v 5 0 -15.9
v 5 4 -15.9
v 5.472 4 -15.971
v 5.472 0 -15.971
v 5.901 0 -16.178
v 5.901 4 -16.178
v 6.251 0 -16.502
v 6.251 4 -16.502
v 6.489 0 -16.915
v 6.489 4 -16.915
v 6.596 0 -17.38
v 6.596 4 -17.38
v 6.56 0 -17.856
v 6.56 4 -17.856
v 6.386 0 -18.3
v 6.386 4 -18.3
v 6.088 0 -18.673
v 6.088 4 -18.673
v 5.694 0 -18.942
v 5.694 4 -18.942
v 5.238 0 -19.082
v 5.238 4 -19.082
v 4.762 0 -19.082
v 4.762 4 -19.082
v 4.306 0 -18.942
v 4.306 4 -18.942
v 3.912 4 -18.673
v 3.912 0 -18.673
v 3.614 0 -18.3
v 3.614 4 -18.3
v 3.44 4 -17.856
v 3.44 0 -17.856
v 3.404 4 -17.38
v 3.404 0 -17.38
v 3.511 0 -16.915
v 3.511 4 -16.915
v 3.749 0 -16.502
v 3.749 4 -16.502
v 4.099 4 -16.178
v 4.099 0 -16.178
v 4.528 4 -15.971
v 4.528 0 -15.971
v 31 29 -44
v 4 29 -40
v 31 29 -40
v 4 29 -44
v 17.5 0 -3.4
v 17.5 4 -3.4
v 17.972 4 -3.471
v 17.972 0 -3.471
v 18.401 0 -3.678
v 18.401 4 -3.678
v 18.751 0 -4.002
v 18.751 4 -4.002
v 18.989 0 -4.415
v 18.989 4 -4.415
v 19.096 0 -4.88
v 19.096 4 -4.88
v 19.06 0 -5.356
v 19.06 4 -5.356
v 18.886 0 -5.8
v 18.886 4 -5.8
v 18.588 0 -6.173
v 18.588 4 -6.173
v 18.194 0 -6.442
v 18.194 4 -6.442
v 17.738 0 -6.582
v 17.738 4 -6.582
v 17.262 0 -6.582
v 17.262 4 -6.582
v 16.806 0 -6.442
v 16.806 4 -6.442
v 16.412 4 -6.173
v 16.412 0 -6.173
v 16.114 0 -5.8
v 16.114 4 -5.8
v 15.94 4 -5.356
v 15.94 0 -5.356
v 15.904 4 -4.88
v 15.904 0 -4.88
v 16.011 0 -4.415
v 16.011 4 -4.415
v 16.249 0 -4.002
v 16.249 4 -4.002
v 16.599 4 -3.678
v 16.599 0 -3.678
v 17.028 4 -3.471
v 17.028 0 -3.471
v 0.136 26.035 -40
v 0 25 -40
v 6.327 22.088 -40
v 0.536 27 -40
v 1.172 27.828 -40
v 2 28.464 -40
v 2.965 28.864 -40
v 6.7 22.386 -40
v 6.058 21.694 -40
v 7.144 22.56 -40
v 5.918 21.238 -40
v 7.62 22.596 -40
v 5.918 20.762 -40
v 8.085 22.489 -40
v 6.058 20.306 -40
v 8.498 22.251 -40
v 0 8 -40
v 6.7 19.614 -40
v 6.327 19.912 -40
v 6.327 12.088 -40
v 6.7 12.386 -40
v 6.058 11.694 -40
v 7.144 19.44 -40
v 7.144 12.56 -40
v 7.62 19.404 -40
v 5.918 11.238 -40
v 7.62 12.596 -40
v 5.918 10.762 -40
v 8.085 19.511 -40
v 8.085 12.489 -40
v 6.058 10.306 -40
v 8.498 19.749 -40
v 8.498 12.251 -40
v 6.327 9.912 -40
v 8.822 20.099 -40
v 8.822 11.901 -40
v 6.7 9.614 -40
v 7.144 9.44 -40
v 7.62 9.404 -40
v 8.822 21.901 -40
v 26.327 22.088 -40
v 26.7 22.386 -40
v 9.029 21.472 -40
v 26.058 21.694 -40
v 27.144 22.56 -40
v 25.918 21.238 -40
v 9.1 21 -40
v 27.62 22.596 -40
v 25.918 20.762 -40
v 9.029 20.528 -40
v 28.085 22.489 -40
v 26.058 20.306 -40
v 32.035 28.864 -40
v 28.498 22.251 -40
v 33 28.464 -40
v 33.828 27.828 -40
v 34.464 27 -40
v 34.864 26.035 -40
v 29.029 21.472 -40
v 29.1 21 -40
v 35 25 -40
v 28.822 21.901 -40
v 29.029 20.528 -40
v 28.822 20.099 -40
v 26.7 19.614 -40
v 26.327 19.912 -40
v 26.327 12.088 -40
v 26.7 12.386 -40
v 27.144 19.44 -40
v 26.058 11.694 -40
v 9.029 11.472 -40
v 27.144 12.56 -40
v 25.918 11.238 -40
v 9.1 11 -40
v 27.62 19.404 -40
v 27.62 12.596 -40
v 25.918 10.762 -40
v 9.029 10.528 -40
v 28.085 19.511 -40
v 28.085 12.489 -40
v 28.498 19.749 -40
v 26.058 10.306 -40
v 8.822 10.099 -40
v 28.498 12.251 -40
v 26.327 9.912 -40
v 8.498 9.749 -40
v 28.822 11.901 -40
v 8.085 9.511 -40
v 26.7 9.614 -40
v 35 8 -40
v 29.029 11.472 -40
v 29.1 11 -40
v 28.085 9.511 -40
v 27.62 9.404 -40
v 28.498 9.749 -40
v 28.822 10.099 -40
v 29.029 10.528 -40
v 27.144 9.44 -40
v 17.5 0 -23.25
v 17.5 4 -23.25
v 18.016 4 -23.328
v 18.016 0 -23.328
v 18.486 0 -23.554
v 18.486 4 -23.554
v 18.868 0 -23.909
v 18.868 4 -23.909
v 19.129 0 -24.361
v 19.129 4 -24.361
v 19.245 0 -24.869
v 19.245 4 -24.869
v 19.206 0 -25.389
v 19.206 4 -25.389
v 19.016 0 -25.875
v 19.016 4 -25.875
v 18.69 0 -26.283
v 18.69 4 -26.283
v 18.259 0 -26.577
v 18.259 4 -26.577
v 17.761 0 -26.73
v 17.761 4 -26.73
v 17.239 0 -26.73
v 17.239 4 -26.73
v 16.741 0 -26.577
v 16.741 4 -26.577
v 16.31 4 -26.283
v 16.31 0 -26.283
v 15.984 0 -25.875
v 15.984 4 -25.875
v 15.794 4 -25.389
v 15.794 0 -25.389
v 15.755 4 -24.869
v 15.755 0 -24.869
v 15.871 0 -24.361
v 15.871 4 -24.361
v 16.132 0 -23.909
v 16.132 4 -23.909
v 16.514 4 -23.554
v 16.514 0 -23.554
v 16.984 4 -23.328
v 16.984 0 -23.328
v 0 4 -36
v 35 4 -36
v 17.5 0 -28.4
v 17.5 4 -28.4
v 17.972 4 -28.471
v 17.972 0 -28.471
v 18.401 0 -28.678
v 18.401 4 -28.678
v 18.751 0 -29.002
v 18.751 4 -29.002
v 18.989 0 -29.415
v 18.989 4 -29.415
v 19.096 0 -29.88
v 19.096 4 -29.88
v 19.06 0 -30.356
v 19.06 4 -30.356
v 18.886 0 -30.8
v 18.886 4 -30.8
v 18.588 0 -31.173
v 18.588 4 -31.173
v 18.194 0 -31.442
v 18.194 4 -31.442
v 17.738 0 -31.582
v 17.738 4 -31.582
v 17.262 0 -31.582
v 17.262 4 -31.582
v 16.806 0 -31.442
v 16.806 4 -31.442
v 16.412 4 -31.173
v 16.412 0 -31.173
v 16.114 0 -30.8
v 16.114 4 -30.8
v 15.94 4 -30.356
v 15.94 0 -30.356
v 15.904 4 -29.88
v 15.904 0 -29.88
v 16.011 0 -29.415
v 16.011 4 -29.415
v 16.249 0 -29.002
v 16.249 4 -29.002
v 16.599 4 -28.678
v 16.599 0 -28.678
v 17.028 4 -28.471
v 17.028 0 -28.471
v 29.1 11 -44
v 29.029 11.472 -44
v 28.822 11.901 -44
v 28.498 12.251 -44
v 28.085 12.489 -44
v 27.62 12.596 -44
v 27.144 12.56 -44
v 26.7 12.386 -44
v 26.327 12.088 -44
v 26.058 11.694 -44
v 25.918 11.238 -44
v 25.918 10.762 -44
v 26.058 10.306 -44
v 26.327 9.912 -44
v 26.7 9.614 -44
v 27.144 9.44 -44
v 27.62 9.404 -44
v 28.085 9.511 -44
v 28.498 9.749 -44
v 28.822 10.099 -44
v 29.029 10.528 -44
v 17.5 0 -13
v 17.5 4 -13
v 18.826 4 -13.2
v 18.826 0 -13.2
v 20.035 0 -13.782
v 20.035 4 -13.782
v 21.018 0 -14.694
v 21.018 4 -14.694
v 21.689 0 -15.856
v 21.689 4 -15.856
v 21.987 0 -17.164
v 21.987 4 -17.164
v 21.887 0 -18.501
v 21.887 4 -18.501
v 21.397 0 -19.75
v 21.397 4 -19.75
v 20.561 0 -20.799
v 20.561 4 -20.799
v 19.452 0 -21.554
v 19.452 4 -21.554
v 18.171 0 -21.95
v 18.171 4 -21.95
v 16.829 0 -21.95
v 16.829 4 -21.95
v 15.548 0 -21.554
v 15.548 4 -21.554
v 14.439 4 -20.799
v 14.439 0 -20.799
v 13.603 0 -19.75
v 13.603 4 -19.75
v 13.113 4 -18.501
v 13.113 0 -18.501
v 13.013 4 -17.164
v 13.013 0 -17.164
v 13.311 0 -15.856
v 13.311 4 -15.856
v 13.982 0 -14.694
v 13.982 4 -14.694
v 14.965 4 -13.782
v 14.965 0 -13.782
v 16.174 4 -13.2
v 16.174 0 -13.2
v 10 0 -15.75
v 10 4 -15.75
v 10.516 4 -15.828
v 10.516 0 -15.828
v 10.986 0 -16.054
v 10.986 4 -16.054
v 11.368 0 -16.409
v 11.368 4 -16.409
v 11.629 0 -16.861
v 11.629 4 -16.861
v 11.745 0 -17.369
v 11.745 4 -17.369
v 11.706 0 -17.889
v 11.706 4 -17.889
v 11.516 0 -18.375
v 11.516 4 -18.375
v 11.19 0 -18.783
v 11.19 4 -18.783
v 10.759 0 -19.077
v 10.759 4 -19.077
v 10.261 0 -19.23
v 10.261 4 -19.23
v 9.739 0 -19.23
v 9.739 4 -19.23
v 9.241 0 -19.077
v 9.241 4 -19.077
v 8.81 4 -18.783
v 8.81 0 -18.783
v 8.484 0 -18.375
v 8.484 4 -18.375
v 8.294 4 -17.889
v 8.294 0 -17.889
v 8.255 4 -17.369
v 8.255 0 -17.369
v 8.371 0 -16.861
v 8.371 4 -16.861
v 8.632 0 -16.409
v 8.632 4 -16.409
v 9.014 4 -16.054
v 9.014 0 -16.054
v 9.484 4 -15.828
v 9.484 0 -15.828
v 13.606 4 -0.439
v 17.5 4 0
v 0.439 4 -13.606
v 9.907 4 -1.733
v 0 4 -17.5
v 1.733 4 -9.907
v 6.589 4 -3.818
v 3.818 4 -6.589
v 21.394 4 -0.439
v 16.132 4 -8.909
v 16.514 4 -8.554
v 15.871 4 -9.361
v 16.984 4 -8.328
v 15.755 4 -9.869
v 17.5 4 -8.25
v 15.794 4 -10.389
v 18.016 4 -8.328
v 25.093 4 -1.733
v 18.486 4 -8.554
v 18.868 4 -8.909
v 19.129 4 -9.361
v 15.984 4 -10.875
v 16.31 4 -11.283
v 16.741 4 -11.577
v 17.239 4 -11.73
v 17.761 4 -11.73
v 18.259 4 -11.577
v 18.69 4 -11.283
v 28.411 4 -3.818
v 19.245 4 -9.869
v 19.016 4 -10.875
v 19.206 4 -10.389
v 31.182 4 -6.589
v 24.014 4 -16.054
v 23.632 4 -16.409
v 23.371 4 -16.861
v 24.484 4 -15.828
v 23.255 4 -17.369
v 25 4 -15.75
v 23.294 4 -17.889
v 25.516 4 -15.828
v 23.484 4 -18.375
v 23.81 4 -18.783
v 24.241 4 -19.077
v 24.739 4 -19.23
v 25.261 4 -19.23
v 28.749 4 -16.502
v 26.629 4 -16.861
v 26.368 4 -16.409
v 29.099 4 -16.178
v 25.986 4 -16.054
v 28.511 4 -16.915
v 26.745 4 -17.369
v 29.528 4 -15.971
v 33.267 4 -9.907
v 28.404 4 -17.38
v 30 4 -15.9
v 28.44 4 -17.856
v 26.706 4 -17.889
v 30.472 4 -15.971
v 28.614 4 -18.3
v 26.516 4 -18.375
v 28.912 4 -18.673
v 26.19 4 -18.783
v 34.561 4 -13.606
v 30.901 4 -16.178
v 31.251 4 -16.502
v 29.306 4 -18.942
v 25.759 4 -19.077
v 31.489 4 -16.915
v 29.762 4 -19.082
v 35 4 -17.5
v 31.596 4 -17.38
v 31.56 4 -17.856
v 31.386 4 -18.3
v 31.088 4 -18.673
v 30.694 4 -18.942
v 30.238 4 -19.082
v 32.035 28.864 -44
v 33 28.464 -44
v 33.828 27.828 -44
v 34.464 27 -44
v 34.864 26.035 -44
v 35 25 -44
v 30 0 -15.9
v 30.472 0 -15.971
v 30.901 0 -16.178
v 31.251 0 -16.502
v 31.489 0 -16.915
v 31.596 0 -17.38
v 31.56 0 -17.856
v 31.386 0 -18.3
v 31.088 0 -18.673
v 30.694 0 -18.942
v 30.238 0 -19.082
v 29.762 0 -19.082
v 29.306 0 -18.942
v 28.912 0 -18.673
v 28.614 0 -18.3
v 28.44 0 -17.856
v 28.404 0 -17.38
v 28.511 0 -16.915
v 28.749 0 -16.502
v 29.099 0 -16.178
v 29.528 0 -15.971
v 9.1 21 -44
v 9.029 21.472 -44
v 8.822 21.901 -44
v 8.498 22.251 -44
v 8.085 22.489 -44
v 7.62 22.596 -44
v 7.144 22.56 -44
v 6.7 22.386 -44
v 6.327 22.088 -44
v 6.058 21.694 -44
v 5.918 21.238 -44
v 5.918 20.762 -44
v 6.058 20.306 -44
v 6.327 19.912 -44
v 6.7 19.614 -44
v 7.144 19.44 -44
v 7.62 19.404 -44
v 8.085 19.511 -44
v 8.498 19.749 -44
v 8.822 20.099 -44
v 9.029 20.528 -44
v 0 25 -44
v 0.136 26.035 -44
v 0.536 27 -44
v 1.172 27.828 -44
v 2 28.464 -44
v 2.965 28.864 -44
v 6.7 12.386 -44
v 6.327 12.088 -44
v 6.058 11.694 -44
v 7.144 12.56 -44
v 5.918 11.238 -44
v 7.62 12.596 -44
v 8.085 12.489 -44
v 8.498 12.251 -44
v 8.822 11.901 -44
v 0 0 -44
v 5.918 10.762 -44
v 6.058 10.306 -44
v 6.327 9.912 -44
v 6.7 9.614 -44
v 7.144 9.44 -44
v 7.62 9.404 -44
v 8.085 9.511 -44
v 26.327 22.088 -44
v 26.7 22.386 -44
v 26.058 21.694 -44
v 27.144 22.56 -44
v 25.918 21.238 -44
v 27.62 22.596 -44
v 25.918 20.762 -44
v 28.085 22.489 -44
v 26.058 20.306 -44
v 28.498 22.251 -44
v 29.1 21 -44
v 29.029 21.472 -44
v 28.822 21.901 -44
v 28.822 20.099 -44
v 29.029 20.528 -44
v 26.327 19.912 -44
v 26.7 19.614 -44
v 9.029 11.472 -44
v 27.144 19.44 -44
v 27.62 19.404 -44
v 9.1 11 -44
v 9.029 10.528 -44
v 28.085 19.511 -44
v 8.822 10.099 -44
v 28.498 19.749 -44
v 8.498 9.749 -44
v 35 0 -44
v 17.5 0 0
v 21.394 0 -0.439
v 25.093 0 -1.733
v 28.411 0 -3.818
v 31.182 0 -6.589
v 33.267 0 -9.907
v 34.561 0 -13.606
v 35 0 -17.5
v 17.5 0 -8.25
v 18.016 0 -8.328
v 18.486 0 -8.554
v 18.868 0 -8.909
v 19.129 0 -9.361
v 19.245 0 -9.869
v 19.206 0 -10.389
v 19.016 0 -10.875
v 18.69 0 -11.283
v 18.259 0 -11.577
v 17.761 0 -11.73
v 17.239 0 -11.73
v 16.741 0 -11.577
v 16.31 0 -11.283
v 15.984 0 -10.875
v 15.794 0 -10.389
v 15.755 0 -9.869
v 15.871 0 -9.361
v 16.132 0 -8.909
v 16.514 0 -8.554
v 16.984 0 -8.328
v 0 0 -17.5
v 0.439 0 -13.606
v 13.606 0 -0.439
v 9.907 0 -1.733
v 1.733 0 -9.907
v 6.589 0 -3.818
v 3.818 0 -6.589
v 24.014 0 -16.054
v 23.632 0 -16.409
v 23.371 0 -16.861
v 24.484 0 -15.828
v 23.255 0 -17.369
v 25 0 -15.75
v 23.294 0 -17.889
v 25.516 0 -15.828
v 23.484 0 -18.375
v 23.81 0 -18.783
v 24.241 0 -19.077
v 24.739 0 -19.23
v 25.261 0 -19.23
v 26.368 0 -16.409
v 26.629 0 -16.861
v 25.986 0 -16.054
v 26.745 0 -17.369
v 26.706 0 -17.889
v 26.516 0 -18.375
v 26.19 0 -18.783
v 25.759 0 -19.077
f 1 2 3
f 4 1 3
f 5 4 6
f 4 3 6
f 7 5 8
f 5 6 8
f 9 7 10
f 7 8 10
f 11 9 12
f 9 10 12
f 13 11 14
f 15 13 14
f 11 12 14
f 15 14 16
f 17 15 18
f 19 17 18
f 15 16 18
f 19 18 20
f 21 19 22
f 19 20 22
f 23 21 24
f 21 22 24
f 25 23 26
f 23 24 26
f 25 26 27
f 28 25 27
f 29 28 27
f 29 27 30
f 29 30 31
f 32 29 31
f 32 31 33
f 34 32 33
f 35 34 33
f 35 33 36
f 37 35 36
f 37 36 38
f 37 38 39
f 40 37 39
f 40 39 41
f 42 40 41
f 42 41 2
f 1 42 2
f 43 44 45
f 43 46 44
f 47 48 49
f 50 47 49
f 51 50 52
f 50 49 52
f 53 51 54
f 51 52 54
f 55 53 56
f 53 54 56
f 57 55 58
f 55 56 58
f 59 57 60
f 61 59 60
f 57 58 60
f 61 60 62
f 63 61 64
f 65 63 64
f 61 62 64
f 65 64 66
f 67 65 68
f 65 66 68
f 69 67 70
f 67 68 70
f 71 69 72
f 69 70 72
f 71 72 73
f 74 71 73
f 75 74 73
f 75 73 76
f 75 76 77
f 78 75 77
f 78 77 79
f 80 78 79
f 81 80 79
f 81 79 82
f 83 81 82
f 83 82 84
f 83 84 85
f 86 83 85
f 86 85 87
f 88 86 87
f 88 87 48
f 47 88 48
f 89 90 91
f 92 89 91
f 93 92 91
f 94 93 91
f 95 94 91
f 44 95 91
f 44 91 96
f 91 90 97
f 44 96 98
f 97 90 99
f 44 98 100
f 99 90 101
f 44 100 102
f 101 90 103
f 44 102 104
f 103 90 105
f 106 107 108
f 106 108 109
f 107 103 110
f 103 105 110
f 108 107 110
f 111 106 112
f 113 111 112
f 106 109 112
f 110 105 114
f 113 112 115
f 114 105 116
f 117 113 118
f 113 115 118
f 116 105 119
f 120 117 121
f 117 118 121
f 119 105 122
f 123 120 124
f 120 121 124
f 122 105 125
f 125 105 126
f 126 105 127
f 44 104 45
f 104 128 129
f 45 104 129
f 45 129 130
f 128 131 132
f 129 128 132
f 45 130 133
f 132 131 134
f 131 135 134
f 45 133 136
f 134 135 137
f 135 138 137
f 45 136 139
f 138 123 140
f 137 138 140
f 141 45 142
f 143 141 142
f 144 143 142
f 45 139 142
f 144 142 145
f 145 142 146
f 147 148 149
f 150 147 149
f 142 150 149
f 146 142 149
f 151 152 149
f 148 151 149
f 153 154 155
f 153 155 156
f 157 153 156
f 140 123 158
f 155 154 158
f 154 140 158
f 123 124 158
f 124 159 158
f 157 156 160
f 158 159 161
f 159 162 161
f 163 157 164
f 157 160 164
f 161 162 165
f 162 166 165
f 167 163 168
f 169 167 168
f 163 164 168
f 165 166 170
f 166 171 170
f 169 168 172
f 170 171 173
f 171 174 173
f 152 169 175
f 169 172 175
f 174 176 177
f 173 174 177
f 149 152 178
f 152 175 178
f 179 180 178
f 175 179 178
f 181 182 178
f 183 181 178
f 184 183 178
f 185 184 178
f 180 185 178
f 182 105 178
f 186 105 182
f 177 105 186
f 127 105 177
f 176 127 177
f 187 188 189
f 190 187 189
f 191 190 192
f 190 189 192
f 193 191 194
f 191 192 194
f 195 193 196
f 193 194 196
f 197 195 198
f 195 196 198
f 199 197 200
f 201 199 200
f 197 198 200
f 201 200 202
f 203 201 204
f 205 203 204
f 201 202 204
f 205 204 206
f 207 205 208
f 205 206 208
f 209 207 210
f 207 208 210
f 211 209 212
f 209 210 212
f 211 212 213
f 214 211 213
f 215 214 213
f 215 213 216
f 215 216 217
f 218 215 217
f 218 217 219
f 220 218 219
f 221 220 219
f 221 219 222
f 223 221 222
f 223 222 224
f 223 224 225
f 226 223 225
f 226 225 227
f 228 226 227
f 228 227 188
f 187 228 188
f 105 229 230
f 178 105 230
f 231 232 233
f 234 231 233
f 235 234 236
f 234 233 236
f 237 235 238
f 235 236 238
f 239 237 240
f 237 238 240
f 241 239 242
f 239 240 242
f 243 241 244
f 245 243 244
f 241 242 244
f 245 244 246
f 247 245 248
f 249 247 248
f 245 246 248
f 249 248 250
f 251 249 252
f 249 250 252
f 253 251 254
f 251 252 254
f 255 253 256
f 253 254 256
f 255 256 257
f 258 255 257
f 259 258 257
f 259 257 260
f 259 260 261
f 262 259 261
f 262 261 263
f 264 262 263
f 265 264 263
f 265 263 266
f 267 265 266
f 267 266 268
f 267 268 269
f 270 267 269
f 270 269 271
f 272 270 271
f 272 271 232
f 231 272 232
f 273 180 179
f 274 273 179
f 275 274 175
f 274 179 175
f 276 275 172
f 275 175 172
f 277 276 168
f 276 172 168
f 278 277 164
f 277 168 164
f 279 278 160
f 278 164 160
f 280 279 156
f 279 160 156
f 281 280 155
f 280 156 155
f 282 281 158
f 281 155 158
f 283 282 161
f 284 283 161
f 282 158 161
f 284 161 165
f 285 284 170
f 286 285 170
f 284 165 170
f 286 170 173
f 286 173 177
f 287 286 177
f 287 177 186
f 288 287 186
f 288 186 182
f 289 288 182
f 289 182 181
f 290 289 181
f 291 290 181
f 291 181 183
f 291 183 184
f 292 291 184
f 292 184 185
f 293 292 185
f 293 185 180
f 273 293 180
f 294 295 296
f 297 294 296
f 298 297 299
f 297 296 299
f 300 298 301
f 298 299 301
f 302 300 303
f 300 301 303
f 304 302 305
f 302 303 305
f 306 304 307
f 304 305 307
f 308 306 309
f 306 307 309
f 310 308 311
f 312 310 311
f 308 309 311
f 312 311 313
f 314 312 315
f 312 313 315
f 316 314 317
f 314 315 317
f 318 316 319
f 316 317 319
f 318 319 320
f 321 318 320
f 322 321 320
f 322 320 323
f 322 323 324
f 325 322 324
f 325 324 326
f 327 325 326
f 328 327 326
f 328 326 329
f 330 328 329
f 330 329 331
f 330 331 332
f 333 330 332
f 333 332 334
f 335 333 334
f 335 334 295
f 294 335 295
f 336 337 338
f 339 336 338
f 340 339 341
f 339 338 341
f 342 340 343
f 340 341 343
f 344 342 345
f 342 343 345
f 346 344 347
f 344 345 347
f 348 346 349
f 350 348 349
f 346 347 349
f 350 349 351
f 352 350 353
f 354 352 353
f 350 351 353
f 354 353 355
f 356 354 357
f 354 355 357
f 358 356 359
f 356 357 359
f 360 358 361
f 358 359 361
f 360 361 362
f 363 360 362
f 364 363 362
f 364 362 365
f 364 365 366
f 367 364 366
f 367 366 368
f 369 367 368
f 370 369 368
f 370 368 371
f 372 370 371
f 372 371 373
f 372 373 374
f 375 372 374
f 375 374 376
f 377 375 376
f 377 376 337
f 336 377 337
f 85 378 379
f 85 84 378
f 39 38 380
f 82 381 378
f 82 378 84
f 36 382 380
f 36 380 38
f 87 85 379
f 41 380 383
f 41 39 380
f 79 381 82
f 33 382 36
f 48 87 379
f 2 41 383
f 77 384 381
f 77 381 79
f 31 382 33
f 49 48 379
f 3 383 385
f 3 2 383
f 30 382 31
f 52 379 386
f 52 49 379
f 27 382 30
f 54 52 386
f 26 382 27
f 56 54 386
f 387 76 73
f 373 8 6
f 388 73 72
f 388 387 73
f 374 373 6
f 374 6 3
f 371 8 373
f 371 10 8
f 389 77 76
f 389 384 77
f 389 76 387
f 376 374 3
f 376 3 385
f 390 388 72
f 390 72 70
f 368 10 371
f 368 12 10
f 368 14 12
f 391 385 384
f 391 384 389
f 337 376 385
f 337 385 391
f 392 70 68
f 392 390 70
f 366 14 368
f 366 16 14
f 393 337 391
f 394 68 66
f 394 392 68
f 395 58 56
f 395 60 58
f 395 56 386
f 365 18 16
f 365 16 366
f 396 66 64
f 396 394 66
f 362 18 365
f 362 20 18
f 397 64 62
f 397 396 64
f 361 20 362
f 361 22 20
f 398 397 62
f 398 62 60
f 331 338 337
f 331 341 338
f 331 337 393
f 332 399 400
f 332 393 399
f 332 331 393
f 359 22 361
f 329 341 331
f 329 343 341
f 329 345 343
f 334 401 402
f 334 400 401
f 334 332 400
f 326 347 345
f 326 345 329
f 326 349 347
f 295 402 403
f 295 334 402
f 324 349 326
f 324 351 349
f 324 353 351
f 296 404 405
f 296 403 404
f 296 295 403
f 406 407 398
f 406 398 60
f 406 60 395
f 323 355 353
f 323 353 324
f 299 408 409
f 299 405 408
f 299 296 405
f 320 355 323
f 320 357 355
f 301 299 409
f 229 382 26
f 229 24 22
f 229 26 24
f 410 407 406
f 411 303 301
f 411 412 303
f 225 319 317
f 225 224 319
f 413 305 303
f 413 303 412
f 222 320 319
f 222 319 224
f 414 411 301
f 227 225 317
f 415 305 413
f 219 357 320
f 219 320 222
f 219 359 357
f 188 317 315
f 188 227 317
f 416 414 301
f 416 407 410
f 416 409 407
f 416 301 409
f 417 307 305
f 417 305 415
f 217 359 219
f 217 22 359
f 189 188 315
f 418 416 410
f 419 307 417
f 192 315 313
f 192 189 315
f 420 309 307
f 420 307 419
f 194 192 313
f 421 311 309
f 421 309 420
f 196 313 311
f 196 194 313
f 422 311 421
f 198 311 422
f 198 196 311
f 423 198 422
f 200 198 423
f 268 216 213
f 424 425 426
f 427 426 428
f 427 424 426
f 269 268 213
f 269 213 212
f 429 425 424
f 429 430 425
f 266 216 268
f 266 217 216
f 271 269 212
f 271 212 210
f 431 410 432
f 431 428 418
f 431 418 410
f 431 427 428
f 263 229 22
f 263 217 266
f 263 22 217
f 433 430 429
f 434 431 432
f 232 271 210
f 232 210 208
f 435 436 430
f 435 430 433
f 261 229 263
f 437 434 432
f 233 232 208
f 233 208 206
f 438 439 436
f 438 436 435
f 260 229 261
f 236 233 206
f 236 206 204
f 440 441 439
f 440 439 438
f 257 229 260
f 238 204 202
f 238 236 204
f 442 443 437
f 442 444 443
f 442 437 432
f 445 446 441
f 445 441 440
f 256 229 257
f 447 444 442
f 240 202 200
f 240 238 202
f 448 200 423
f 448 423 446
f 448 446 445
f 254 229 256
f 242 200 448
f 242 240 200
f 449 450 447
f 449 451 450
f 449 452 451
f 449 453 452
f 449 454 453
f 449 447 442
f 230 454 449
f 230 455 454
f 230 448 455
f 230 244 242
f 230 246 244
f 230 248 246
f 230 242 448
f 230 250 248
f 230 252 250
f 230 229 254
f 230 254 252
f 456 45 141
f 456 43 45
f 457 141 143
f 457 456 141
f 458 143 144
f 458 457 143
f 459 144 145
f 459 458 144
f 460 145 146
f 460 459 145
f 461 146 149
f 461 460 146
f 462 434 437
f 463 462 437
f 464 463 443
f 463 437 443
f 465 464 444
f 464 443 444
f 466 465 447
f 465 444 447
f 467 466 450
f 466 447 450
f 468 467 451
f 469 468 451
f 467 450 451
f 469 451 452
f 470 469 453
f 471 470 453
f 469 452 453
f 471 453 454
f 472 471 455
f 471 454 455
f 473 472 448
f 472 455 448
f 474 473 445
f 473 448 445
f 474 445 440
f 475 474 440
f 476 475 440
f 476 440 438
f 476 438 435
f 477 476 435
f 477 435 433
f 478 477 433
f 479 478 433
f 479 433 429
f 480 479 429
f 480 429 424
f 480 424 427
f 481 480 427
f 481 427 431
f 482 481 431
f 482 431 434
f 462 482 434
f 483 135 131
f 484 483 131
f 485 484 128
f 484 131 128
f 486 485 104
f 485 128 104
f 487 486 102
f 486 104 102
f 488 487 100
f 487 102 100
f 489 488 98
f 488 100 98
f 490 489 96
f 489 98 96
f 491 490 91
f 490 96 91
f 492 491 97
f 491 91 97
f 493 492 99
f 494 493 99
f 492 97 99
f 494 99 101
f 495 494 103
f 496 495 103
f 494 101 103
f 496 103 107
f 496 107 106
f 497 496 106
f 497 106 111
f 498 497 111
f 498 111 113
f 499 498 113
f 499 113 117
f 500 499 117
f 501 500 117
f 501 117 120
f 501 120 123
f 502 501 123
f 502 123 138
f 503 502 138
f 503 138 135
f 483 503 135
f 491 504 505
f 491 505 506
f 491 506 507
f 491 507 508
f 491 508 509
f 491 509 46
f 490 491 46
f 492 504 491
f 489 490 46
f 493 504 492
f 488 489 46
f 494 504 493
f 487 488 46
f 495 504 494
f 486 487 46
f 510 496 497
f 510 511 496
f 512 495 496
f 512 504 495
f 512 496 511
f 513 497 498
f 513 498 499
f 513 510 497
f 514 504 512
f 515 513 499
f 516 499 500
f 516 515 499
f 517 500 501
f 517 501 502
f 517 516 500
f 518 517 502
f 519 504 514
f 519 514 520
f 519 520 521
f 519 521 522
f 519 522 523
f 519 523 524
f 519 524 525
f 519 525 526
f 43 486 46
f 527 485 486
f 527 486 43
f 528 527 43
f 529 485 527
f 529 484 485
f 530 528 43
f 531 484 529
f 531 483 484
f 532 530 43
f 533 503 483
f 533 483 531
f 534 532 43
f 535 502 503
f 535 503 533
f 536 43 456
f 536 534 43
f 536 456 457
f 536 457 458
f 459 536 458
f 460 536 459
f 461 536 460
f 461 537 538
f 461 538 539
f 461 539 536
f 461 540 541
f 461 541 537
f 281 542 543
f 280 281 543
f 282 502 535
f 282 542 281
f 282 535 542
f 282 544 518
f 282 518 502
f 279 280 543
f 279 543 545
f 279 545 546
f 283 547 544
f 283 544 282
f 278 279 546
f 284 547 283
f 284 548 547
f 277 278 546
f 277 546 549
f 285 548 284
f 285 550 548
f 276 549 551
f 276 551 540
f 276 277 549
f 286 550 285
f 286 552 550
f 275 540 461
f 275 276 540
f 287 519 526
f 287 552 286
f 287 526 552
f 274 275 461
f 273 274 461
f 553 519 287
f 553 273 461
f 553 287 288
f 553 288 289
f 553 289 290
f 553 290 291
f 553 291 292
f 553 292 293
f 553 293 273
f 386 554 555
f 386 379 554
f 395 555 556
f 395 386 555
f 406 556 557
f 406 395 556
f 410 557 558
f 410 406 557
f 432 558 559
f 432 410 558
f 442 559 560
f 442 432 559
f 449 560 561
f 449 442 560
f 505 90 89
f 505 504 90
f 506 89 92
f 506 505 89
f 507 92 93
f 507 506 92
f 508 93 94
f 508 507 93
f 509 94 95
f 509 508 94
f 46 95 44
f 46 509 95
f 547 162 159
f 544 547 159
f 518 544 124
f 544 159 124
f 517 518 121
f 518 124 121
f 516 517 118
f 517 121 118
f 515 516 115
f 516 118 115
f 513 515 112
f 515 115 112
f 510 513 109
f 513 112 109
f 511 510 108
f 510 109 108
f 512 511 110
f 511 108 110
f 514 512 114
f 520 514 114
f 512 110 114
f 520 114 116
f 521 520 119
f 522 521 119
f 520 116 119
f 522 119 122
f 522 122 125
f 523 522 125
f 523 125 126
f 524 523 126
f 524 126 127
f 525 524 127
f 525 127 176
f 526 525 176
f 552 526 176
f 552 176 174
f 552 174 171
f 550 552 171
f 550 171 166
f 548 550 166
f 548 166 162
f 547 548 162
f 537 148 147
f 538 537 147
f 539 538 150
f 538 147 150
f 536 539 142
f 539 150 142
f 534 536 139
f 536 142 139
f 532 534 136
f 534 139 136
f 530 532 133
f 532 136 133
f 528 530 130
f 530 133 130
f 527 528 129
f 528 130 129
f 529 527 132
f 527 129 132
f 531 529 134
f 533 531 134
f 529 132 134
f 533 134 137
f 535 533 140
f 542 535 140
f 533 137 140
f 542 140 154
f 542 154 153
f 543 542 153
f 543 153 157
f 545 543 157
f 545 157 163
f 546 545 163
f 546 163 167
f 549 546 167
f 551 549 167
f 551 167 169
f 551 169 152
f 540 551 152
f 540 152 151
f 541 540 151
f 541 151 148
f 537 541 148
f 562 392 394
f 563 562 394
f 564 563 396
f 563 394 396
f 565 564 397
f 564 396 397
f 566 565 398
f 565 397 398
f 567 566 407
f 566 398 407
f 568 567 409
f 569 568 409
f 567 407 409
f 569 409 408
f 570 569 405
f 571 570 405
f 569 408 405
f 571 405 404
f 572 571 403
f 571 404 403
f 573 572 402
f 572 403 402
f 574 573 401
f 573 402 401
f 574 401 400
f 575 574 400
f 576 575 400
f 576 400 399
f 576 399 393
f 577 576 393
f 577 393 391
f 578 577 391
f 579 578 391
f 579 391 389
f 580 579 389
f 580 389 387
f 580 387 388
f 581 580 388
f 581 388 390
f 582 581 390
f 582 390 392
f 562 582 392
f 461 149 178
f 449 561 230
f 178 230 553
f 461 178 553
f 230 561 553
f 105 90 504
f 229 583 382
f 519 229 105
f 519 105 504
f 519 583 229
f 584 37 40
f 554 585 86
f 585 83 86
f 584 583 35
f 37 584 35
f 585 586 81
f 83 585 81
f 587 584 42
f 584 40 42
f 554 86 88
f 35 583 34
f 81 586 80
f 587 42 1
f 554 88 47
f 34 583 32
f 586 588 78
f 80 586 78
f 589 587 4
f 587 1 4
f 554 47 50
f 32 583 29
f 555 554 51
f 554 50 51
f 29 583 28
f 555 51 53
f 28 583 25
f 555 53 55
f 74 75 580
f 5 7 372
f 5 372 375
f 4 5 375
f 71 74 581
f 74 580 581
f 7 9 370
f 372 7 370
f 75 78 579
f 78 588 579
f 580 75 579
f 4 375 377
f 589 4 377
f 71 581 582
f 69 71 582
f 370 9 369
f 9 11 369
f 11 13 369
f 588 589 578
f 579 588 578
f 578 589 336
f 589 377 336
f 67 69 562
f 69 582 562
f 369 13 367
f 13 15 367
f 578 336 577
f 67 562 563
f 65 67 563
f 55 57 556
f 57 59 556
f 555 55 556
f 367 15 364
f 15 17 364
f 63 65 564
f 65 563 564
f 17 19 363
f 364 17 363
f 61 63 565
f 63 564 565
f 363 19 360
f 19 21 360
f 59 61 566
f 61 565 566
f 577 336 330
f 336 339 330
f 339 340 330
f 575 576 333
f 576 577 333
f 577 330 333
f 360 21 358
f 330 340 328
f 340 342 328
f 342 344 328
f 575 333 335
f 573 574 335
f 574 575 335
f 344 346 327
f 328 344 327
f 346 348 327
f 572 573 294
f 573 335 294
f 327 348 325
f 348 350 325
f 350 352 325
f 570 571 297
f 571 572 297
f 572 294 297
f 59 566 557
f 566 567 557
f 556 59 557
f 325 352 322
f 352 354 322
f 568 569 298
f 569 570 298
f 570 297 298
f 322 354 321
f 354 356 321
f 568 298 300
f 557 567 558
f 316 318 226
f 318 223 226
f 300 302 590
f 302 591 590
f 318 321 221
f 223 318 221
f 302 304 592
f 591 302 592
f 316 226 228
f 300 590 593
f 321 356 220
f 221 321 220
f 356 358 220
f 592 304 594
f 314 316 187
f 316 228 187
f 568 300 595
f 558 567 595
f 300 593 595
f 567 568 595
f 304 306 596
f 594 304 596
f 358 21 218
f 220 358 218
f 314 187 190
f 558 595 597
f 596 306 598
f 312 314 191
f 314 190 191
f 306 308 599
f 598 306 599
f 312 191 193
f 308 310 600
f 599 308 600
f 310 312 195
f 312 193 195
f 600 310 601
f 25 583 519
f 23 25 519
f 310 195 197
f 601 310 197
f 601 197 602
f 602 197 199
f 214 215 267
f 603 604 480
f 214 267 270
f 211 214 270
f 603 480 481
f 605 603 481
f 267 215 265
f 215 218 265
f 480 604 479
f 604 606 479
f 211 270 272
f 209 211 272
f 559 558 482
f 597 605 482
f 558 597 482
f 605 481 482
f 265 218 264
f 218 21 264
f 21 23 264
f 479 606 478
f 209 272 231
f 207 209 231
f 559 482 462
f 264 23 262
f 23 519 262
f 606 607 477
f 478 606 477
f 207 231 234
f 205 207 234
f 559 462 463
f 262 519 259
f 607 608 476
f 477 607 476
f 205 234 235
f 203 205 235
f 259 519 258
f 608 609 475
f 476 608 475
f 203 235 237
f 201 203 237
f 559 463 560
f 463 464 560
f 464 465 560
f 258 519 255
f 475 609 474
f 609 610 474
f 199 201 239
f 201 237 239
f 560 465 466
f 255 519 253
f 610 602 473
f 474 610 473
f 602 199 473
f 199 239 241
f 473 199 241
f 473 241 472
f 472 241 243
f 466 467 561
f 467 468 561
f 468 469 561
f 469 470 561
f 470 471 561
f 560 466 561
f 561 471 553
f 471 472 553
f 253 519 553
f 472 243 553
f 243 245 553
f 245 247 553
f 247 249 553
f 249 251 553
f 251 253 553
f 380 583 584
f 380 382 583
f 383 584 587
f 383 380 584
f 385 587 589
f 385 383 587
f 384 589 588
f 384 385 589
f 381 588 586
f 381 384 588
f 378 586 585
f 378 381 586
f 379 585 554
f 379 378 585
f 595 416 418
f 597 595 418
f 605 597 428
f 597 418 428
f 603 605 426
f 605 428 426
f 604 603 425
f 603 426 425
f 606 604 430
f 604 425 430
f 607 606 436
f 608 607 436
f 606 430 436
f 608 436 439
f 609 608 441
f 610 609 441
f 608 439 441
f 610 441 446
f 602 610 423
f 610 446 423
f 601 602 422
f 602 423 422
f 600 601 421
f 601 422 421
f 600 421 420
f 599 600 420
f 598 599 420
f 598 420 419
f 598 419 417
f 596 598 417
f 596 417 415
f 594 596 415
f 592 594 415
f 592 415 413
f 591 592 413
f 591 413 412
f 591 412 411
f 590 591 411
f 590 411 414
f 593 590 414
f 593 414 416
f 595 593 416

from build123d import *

# Parameters (mm, degrees)
SKETCH_1_W          = 35
SKETCH_1_H          = 44
EXTRUDE_1_DEPTH     = 4
SKETCH_2_W          = 35
SKETCH_2_H          = 4
EXTRUDE_2_DEPTH     = 25
SKETCH_3_R          = 4.5
SKETCH_3_R_2        = 1.75
SKETCH_3_R_3        = 1.6
CUT_EXTRUDE_1_DEPTH = 20
CHAMFER_1_SIZE      = 4
SKETCH_5_R          = 1.6
CUT_EXTRUDE_2_DEPTH = 20
FILLET_1_R          = 17.5
FILLET_2_R          = 4


with BuildPart() as part:
    # 草图1 → 凸台-拉伸1 (new body)
    with BuildSketch(Plane(origin=(0, 0, 0), x_dir=(1, 0, 0), z_dir=(0, 1, 0))):
        with Locations((17.5, 22)):
            Rectangle(SKETCH_1_W, SKETCH_1_H)
    extrude(amount=EXTRUDE_1_DEPTH)

    # 草图2 → 凸台-拉伸2 (add)
    with BuildSketch(Plane(origin=(0, 4, 0), x_dir=(1, 0, 0), z_dir=(0, 1, 0))):
        with Locations((17.5, 42)):
            Rectangle(SKETCH_2_W, SKETCH_2_H)
    extrude(amount=EXTRUDE_2_DEPTH)

    # 草图3 → 切除-拉伸1 (cut)
    with BuildSketch(Plane(origin=(0, 4, 0), x_dir=(1, 0, 0), z_dir=(0, 1, 0))):
        with Locations(Location((17.5, 17.5, 0), (0, 0, 270))):
            Circle(SKETCH_3_R)
        with Locations(Location((17.5, 25, 0), (0, 0, 270))):
            Circle(SKETCH_3_R_2)
        with Locations(Location((25, 17.5, 0), (0, 0, 270))):
            Circle(SKETCH_3_R_2)
        with Locations(Location((10, 17.5, 0), (0, 0, 270))):
            Circle(SKETCH_3_R_2)
        with Locations(Location((17.5, 10, 0), (0, 0, 270))):
            Circle(SKETCH_3_R_2)
        with Locations(Location((17.5, 30, 0), (0, 0, 270))):
            Circle(SKETCH_3_R_3)
        with Locations(Location((30, 17.5, 0), (0, 0, 270))):
            Circle(SKETCH_3_R_3)
        with Locations(Location((17.5, 5, 0), (0, 0, 270))):
            Circle(SKETCH_3_R_3)
        with Locations(Location((5, 17.5, 0), (0, 0, 270))):
            Circle(SKETCH_3_R_3)
    extrude(amount=-CUT_EXTRUDE_1_DEPTH, mode=Mode.SUBTRACT)

    # 倒角1
    chamfer_1_edges = [part.edges().sort_by_distance(p)[0] for p in [
        (17.5, 4, -40),
    ]]
    chamfer(chamfer_1_edges, length=CHAMFER_1_SIZE)

    # 草图5 → 切除-拉伸2 (cut)
    with BuildSketch(Plane.XY.offset(-40)):
        with Locations((7.5, 21)):
            Circle(SKETCH_5_R)
        with Locations((27.5, 21)):
            Circle(SKETCH_5_R)
        with Locations((27.5, 11)):
            Circle(SKETCH_5_R)
        with Locations((7.5, 11)):
            Circle(SKETCH_5_R)
    extrude(amount=-CUT_EXTRUDE_2_DEPTH, mode=Mode.SUBTRACT)

    # 圆角1
    fillet_1_edges = [part.edges().sort_by_distance(p)[0] for p in [
        (35, 2, 0),
        (0, 2, 0),
    ]]
    fillet(fillet_1_edges, radius=FILLET_1_R - 0.0001)  # a hair under: the kernel refuses the full size

    # 圆角2
    fillet_2_edges = [part.edges().sort_by_distance(p)[0] for p in [
        (0, 29, -42),
        (35, 29, -42),
    ]]
    fillet(fillet_2_edges, radius=FILLET_2_R)


solid = part.part
